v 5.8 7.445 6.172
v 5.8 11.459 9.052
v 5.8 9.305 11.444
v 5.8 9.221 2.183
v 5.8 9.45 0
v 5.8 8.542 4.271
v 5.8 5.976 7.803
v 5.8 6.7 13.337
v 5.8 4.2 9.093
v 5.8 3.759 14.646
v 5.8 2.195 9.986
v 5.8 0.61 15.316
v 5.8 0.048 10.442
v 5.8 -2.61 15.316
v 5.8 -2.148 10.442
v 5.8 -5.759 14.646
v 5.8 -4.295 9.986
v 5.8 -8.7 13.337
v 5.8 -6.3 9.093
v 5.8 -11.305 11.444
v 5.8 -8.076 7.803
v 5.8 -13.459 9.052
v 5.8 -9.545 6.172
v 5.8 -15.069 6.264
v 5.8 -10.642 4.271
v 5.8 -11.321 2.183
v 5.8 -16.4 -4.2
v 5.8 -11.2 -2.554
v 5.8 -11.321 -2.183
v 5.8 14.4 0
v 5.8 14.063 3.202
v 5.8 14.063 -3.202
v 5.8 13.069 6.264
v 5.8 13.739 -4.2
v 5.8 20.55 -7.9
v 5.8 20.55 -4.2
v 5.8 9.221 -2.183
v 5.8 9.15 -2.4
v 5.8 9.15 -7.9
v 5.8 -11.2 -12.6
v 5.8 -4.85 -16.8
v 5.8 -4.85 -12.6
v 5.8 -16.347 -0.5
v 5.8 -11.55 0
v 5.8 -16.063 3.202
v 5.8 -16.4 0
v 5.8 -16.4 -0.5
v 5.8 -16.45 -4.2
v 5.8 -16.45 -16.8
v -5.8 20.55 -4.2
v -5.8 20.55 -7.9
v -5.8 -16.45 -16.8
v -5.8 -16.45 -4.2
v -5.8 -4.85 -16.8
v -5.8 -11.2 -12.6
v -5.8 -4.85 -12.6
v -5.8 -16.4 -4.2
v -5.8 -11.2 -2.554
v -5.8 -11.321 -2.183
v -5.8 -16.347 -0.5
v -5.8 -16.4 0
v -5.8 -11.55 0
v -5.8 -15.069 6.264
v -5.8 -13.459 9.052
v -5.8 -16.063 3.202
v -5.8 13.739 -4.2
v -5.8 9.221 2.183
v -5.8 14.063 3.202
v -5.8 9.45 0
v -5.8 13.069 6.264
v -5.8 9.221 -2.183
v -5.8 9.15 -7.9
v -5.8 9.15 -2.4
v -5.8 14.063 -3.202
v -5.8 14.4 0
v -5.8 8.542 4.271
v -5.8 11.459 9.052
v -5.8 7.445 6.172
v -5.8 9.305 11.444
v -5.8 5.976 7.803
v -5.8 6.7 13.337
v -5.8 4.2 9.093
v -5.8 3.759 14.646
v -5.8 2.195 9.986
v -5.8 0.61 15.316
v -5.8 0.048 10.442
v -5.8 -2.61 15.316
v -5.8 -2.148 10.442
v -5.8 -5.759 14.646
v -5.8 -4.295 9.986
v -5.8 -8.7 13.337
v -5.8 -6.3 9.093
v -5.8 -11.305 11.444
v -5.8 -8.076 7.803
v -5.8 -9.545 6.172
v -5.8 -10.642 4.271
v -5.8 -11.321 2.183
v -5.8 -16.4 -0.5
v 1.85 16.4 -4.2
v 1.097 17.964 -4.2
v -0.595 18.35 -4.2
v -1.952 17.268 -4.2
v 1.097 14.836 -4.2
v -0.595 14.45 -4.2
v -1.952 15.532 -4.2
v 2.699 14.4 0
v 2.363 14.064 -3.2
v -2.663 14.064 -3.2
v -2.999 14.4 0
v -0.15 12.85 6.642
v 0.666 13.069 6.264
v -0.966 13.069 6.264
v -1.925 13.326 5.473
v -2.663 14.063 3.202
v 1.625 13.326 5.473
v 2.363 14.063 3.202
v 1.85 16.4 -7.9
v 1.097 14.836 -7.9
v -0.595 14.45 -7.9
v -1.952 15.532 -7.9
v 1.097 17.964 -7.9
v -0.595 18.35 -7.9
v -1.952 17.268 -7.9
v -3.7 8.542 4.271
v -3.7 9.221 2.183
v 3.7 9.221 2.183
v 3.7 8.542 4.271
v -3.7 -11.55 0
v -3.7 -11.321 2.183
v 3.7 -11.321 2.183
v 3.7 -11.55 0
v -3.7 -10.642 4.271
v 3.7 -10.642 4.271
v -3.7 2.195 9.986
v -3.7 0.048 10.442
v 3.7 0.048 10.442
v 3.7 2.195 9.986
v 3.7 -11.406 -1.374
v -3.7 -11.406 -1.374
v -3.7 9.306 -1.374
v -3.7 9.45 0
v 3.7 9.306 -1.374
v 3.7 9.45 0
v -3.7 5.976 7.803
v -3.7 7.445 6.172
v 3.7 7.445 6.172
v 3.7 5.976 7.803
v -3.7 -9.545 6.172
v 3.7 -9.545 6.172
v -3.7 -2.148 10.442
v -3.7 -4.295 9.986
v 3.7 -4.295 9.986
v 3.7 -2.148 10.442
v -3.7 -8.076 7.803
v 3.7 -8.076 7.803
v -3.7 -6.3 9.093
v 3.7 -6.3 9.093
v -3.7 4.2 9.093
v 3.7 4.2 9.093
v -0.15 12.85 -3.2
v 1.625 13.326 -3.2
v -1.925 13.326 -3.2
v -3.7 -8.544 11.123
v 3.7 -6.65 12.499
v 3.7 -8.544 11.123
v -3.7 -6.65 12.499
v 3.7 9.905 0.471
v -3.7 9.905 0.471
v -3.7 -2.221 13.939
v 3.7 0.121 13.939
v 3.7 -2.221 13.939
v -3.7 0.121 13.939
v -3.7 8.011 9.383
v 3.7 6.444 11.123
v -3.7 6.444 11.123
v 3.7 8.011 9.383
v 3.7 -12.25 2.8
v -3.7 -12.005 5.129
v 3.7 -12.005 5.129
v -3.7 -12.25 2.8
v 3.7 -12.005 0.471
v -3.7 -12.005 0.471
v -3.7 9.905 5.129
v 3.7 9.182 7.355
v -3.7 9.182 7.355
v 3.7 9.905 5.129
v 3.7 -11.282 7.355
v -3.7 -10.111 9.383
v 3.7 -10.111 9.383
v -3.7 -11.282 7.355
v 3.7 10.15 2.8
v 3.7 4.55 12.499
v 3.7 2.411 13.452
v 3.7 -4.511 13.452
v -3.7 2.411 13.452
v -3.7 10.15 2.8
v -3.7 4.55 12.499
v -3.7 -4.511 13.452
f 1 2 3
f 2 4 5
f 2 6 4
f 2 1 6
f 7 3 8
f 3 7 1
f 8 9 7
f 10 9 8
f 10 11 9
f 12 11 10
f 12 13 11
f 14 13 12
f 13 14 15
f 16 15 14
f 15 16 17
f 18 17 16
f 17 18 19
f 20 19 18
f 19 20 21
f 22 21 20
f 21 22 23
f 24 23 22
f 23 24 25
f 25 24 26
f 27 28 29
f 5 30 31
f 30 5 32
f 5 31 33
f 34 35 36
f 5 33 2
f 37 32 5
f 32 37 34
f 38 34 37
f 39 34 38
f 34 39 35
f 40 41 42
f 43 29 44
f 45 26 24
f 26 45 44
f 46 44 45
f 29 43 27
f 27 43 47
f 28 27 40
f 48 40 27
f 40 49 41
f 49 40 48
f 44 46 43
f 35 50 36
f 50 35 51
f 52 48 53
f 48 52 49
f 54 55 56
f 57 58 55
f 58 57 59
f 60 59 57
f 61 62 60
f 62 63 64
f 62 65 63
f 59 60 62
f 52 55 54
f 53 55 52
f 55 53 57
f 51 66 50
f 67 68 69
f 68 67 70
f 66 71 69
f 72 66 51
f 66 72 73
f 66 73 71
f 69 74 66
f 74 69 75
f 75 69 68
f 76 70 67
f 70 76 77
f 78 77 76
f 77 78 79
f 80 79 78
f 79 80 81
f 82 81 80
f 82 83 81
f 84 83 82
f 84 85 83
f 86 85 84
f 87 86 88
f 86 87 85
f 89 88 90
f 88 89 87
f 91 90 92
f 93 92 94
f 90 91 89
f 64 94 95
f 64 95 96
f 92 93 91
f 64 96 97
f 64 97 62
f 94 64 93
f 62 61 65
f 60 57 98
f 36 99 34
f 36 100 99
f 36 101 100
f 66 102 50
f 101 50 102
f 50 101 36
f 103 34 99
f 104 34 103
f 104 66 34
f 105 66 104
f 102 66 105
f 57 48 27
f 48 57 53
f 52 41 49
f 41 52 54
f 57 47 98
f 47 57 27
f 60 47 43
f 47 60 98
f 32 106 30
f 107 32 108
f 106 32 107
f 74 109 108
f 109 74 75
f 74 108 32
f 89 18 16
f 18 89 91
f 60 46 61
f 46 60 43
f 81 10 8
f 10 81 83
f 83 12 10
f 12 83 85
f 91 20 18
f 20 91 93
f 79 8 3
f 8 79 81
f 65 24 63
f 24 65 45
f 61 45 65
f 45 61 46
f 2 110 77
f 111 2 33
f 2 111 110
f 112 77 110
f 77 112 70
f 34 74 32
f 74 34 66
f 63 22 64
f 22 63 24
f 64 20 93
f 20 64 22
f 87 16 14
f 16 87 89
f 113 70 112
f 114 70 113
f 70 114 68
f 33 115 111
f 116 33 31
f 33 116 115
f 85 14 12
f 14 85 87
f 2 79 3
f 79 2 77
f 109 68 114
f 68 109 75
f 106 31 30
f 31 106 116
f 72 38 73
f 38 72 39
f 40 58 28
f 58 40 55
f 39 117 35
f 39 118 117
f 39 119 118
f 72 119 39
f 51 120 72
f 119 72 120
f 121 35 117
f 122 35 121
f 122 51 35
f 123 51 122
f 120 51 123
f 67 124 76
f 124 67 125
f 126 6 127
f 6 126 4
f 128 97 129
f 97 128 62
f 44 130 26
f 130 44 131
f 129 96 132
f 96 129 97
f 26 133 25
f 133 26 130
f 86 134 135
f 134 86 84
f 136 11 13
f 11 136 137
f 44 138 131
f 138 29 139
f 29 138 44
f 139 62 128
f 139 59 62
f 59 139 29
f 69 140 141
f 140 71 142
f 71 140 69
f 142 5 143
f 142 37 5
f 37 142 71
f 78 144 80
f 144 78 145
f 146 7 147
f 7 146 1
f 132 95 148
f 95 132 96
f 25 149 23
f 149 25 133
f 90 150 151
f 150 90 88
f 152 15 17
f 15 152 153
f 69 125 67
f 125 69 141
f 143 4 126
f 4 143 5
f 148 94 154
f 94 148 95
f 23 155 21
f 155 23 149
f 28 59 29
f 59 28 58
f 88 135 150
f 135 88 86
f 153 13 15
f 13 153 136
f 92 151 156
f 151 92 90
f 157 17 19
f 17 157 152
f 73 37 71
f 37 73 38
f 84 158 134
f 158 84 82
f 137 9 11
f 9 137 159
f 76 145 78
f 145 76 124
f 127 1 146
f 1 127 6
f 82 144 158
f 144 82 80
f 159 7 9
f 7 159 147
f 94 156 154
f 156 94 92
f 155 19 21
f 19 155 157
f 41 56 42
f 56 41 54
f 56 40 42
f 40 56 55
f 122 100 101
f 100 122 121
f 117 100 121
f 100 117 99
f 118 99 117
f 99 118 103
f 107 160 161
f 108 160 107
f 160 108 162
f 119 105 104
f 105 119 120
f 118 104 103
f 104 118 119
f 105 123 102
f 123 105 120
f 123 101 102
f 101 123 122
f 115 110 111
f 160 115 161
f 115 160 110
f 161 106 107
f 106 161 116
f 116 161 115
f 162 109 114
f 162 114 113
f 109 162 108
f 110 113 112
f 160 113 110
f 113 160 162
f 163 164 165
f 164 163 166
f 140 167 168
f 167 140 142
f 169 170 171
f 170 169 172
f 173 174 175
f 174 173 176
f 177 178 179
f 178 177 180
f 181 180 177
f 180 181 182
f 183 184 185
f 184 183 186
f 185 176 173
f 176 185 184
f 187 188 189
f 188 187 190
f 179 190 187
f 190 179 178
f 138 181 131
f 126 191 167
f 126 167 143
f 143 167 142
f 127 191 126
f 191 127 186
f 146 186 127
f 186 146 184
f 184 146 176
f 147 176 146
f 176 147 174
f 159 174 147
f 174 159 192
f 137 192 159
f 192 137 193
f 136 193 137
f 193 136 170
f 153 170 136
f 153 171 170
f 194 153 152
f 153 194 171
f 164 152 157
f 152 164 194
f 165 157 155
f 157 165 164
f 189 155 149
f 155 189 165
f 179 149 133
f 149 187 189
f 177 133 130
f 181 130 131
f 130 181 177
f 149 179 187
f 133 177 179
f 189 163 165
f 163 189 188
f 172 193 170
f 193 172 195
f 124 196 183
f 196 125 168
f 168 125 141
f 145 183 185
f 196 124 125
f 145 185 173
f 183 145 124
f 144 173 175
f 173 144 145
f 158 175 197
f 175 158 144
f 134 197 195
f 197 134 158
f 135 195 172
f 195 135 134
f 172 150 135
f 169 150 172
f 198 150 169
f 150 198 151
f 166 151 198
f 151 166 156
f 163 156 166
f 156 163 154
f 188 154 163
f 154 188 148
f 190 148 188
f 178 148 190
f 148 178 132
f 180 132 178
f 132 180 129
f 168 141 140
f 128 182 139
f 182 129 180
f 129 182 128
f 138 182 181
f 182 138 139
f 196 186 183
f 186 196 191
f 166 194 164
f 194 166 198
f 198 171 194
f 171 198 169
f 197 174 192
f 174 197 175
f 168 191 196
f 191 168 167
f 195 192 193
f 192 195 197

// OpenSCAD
// file: ../Tolerance.scad
function LaserCutTolerance() = .02;
function 3dPrinterTolerance() = .4;
// file: ZipTie.scad
function ZipTieWidth()=2.5;
function ZipTieHeight()=1;
function ZipTieLength()=100;

module ZipTie()
{
	cube([ZipTieHeight(),ZipTieLength(), ZipTieWidth()]);
}

ZipTie();
// file: SubtractiveSlidingBearingCap2.scad
use <../Tolerance.scad>
use <../Parameters.scad>
use <../Slider.scad>
use <BallBearing.scad>
use <PlasticScrew.scad>

module BearingCap()
{
translate([-PlasticWidth()/2-BallBearingHeight()/2,-PlasticWidth()/2,-PlasticWidth()*1.25-1.5])
{
	union()
	{
	difference()
	{
		union()
		{
			translate([-3dPrinterTolerance()*2,0,1-3dPrinterTolerance()*2])
			{
				cube([BallBearingHeight()+PlasticWidth()+3dPrinterTolerance()*4, PlasticWidth()+3dPrinterTolerance()*4, SliderHeight()+PlasticWidth()+3dPrinterTolerance()*4]);
			}
			translate([-3dPrinterTolerance()*2,PlasticWidth()+3dPrinterTolerance(),3dPrinterTolerance()])
			{
				cube([BallBearingHeight()+PlasticWidth()+3dPrinterTolerance()*4, PlasticWidth()*2+3dPrinterTolerance(),PlasticWidth()+3dPrinterTolerance()*4+PlasticWidth()]);
			}
			translate([-3dPrinterTolerance()*2,-BallBearingHeight()/2,PlasticWidth()*.25-3dPrinterTolerance()*2])
			{
				cube([BallBearingHeight()+PlasticWidth()+3dPrinterTolerance()*4, BallBearingDiam()/4+PlasticWidth()*2,BallBearingDiam()+PlasticWidth()]);
			}
			translate([-3dPrinterTolerance()*2,-PlasticWidth(),BallBearingDiam()/2+PlasticWidth()*1.25])
			{
				rotate([0,90,0])
				{
					cylinder(BallBearingHeight()+PlasticWidth()+3dPrinterTolerance()*4, BallBearingDiam()/2+PlasticWidth()+3dPrinterTolerance()*2, BallBearingDiam()/2+PlasticWidth()+3dPrinterTolerance()*2);
				}
			}
		}
		translate([-1,-BallBearingHeight()/2,PlasticWidth()*1.25+1+3dPrinterTolerance()])
			{
				cube([BallBearingHeight()+PlasticWidth()+2, BallBearingDiam()/2+PlasticWidth()*2,BallBearingDiam()-PlasticWidth()/4-3dPrinterTolerance()-1]);
			}
	translate([-1,-BallBearingHeight()/2+PlasticWidth()*2-1+3dPrinterTolerance()*3,BallBearingDiam()])
			{
				cube([BallBearingHeight()+PlasticWidth()+2, BallBearingDiam()/2+PlasticWidth(),BallBearingDiam()-PlasticWidth()/4-1]);
			}
		translate([-1,-BallBearingDiam()/2,-PlasticWidth()+3dPrinterTolerance()])
			{
				cube([BallBearingHeight()+PlasticWidth()+2, BallBearingDiam()+PlasticWidth(),PlasticWidth()]);
			}
		translate([-1,-PlasticWidth(),SliderHeight()/2])
		{                                                                                                                                   
			rotate([0,90,0])
			{
				cylinder(BallBearingHeight()+PlasticWidth()+2, BallBearingDiam()/2-PlasticWidth()/6, BallBearingDiam()/2-PlasticWidth()/6);
			}
		}
	}
	translate([-3dPrinterTolerance()*2,PlasticWidth()*2-3dPrinterTolerance()*2,PlasticWidth()-3dPrinterTolerance()])
			{
				cube([BallBearingHeight()+PlasticWidth()+3dPrinterTolerance()*4, PlasticWidth()+3dPrinterTolerance()*4,PlasticWidth()*2+3dPrinterTolerance()*4]);
			}
			translate([PlasticWidth()/2,-BallBearingDiam()/2+PlasticWidth(),SliderHeight()/2])
		{
			rotate([0,90,0])
			{
				BallBearing();
			}
		}
translate([PlasticWidth()/2+ScrewHeadDiameter()/2,-1, SliderHeight()+PlasticWidth()/4])
		{
			rotate([90,0,0])
			{
				union()
				{
					screw();
					cylinder(BallBearingDiam()/2, ScrewHeadDiameter()/2, ScrewHeadDiameter()/2);
				}
			}
		}
}
}
}

//rotate([0,90,0])
//%BallBearing();

//BearingCap();

module SlidingBearingCapSlot()
{
	union()
	{
		BearingCap();
		translate([-BallBearingHeight()/2,-BallBearingDiam()/2+PlasticWidth()/2,0])
			{
				cube([BallBearingHeight(), BallBearingDiam()/2,BallBearingDiam()/2]);
			}
	}
}
		




SlidingBearingCapSlot();
// file: LinearBearing.scad
use <../Tolerance.scad>

function LinearBearingDiam() = 15 + 3dPrinterTolerance();
function LinearBearingInnerDiam() = 8.3 + 3dPrinterTolerance();
function LinearBearingHeight() = 24 + 3dPrinterTolerance();

module LinearBearing()
{
cylinder(LinearBearingHeight(), LinearBearingDiam()/2, LinearBearingDiam()/2, 0);
}


LinearBearing();
// file: Zrod.scad
use <../Tolerance.scad>

function ZrodLength()=1000;
function ZrodDiameter()=8 + 3dPrinterTolerance();  //base case: 8
function ZrodRadius()=ZrodDiameter()/2;

module Zrod()
{
color("Silver")
cylinder(ZrodLength(), ZrodRadius(), ZrodRadius());
}

Zrod();
// file: PlasticScrew.scad
use <../Tolerance.scad>

function ScrewDiameter()= 3.6 + 3dPrinterTolerance();  
function ScrewLength()= 22 + 3dPrinterTolerance();
function ScrewHeadDiameter()= 6.7 + 3dPrinterTolerance();
function ScrewHeadHeight()= 2.5 + 3dPrinterTolerance();

//err on the side of smaller tolerances for screws

module screw()
{
	union()
	{
		translate([0,0,-ScrewLength()])
		{
			cylinder(ScrewLength(), ScrewDiameter()/2,ScrewDiameter()/2);
		}
		cylinder(ScrewHeadHeight(), ScrewHeadDiameter()/2,ScrewHeadDiameter()/2);
	}
}

screw();
// file: BallBearing.scad
use <../Tolerance.scad>

function BallBearingDiam() = 22 + 3dPrinterTolerance(); //USUALLY 22
function BallBearingHeight() = 7 + 3dPrinterTolerance(); //USUALLY 7
function BallBearingInnerDiam()= 7.9 - 3dPrinterTolerance(); //USUALLY 7.9

module BallBearing()
{
cylinder(BallBearingHeight(), BallBearingDiam()/2, BallBearingDiam()/2);
}


BallBearing();
// file: ../Slider.scad
use <Parameters.scad>
use <Vitamins/SubtractiveSlidingBearingCap2.scad>
use <Vitamins/Zrod.scad>
use <Vitamins/LinearBearing.scad>
use <Vitamins/BallBearing.scad>
use <Vitamins/ZipTie.scad>

function BearingGripDiam()= LinearBearingDiam()+PlasticWidth()*2;
function SliderHeight()= LinearBearingHeight()+PlasticWidth()*2;
function GripWidth()= PlasticWidth();
function FlareLength()= (ZBearingSpacing()-ZrodSpacing())/2;
function FlareWidth()= BallBearingDiam()/2-PlasticWidth();

$fn=100;

module LinearBearingGrip()
{
	difference()
	{
		cylinder(SliderHeight(), BearingGripDiam()/2, BearingGripDiam()/2);
		translate([0,0,PlasticWidth()+1])
		{
			LinearBearing();
		}
		translate([0,0,-1])
		{
		cylinder(SliderHeight()+2, LinearBearingDiam()/2.2, LinearBearingDiam()/2.2);
		}
		translate([-BearingGripDiam()/2,LinearBearingDiam()/6,-1])
		{
			cube([SliderHeight()+2, SliderHeight()+2, SliderHeight()+2]);
		}
	}
}

module SliderBase()
{
	union()
	{
		translate([LinearBearingDiam()/2,PlasticWidth()/2-GripWidth(),0])
		{
			cube([ZrodSpacing()-LinearBearingDiam(),GripWidth(),SliderHeight()]);
		}
		translate([0,PlasticWidth()/2,0])
		{
		LinearBearingGrip();				
		}
		translate([ZrodSpacing(),PlasticWidth()/2,0])
		{
		LinearBearingGrip();				
		}
	}
}

module Flare()
{
	translate([-LinearBearingDiam()/2-FlareLength()-PlasticWidth()/2,-GripWidth(),0])
		{
			difference()
			{
				cube([FlareLength(),GripWidth()*2,SliderHeight()]);
					translate([FlareLength()/2-PlasticWidth()/2,0,0])
	{
		//BearingCap();
		SlidingBearingCapSlot();
	}
				}
		}
}

//module BearingCap()
//{
//	translate([-(PlasticWidth()+BallBearingHeight())/2-ZBearingSpacing()/2,-PlasticWidth()*2, -PlasticWidth()])
//	{
//		difference()
//		{
//			union()
//			{
//				cube([BallBearingHeight()+PlasticWidth(), PlasticWidth()*2, SliderHeight()+PlasticWidth()]);
//				translate([0,PlasticWidth()*2,0])
//				{
//					cube([BallBearingHeight()+PlasticWidth(), PlasticWidth()*2,PlasticWidth()]);
//				}
//				translate([0,PlasticWidth()*2,PlasticWidth()])
//				{
//					cube([BallBearingHeight()+PlasticWidth(), PlasticWidth()*2,PlasticWidth()*2]);
//				}
//				translate([0,-BallBearingHeight()/2,PlasticWidth()*.75])
//				{
//					cube([BallBearingHeight()+PlasticWidth(), BallBearingDiam()/4+PlasticWidth()*2,BallBearingDiam()+PlasticWidth()]);
//				}
//				translate([0,-PlasticWidth(),BallBearingDiam()/2+PlasticWidth()*1.25])
//				{
//					rotate([0,90,0])
//					{
//						cylinder(BallBearingHeight()+PlasticWidth(), BallBearingDiam()/2+PlasticWidth()/2, BallBearingDiam()/2+PlasticWidth()/2);
//					}
//				}
//			}
//			translate([-1,-BallBearingHeight()/2,PlasticWidth()*1.25])
//				{
//					cube([BallBearingHeight()+PlasticWidth()+2, BallBearingDiam()/4+PlasticWidth()*2,BallBearingDiam()]);
//				}
//			translate([-1,-PlasticWidth(),SliderHeight()/2])
//			{                                                                                                                                   
//				rotate([0,90,0])
//				{
//					#cylinder(BallBearingHeight()+PlasticWidth()+2, BallBearingDiam()/2-PlasticWidth()/6, BallBearingDiam()/2-PlasticWidth()/6);
//				}
//			}
//		}
//	}
//}

//BearingCap();

module ZipTieHoles()
{
	union()
	{
		translate([LinearBearingDiam()-PlasticWidth()/2,-GripWidth()-1,SliderHeight()/4])
		{
			ZipTie();
		}
		translate([LinearBearingDiam()-PlasticWidth()/2,-GripWidth()-1,SliderHeight()*3/4])
		{
			ZipTie();
		}
		translate([-LinearBearingDiam()+PlasticWidth()/2,-GripWidth()-1,SliderHeight()/4])
		{
			ZipTie();
		}
		translate([-LinearBearingDiam()+PlasticWidth()/2,-GripWidth()-1,SliderHeight()*3/4])
		{
			ZipTie();
		}
	}
}




%cube(size=[ZBearingSpacing(), ZBearingSpacing(), 20,], center=true);


module Slider()
{
	difference()
	{
		union()
		{
			SliderBase();
			ZipTieHoles();			
			Flare();
			mirror([1,0,0])
			{
				translate([-ZrodSpacing(),0,0])
				{
					Flare();
				}
			}
		}
	ZipTieHoles();
	translate([ZrodSpacing()-ZipTieWidth()/2,0,0])
	{
		ZipTieHoles();
	}
	
	

	}
	
}

translate([-ZrodSpacing()/2,0,0])
Slider();
// file: ../Parameters.scad
use<Vitamins/Zrod.scad>
use<Vitamins/LinearBearing.scad>

function mm(i) = i*25.4; 

//Build dimensions (x,y,z)-- x, y and z of printable area, NOT of overall device

//z-rod length, diameter-- dependent on which rods you buy
//(bearing diameter is dependent on rod diameter)


function ZBearingSpacing()= 105;
function ZrodSpacing()=ZBearingSpacing()-LinearBearingDiam()*2-PlasticWidth()*4;
//echo(ZrodSpacing());

//parametric of which hotend is being used (printerbot or bucha nozzle)

//stepper vs servo

//3 parameters (1 for each link) horizontal vs vertical

//paper is a parametric vitamin

//distance between link arms will be calculable based on radius of toolplate




//tolerances
//function LaserCutTolerance() = .02;
//function 3dPrinterTolerance() = .4;



//the equation used for plastic width, it can of course be changed
function PlasticWidth()= (ZrodDiameter()/2);
function SideWidth() = (ZrodDiameter()+PlasticWidth());
// main file
use <../Parameters.scad>
use <../Slider.scad>
use <BallBearing.scad>
use <PlasticScrew.scad>


///this is identical to subtractive sliding bearing cap except that it's centered differently, make this into a boolean at some point

module RawBearingCap()
{
	union()
	{
		difference()
		{
			union()
			{
				translate([0,0,1])
				{
					cube([BallBearingHeight()+PlasticWidth(), PlasticWidth(), SliderHeight()+PlasticWidth()]);
				}
				translate([0,PlasticWidth(),1])
				{
					cube([BallBearingHeight()+PlasticWidth(), PlasticWidth()*2,PlasticWidth()]);
				}
				translate([0,-BallBearingHeight()/2,PlasticWidth()*.25])
				{
					cube([BallBearingHeight()+PlasticWidth(), BallBearingDiam()/4+PlasticWidth()*2,BallBearingDiam()+PlasticWidth()]);
				}
				translate([0,-PlasticWidth(),BallBearingDiam()/2+PlasticWidth()*1.25])
				{
					rotate([0,90,0])
					{
						cylinder(BallBearingHeight()+PlasticWidth(), BallBearingDiam()/2+PlasticWidth(), BallBearingDiam()/2+PlasticWidth());
					}
				}
			}
			translate([-1,-BallBearingHeight()/2,PlasticWidth()*1.25+1])
			{
				cube([BallBearingHeight()+PlasticWidth()+2, BallBearingDiam()/2+PlasticWidth(),BallBearingDiam()-PlasticWidth()/4-1]);
			}
			translate([-1,-BallBearingHeight()/2+PlasticWidth()*2-1,BallBearingDiam()])
			{
				cube([BallBearingHeight()+PlasticWidth()+2, BallBearingDiam()/2+PlasticWidth(),BallBearingDiam()-PlasticWidth()/4-1]);
			}
			translate([-1,-PlasticWidth(),SliderHeight()/2])
			{                                                                                                                                   
				rotate([0,90,0])
				{
					cylinder(BallBearingHeight()+PlasticWidth()+2, BallBearingDiam()/2-PlasticWidth()/6, BallBearingDiam()/2-PlasticWidth()/6);
				}
			}
		}
		translate([0,PlasticWidth()*2,PlasticWidth()])
		{
			cube([BallBearingHeight()+PlasticWidth(), PlasticWidth(),PlasticWidth()*2]);
		}
			
	}
}

module UnPositionedBearingCap()
{
	difference()
	{
		RawBearingCap();
		translate([PlasticWidth()/2,-BallBearingDiam()/2+PlasticWidth(),SliderHeight()/2])
		{
			rotate([0,90,0])
			{
				BallBearing();
			}
		}
		translate([PlasticWidth()/2+ScrewHeadDiameter()/2,-1, SliderHeight()+PlasticWidth()/4])
		{
			rotate([90,0,0])
			{
				union()
				{
					screw();
					cylinder(BallBearingDiam()/2, ScrewHeadDiameter()/2, ScrewHeadDiameter()/2);
				}
			}
		}
	}
}



//rotate([0,90,0])
//%BallBearing();

module BearingCap(Print=true,Foot=true)
{
	if(Print==true)
	{
		translate([-BallBearingDiam()/2-PlasticWidth(),0,BallBearingHeight()+PlasticWidth()])
		{
			rotate([0,90,0])
				{
					UnPositionedBearingCap(true);
				}
		}
	}else{
			if(Foot==true)
			{
				translate([-PlasticWidth()/2-BallBearingHeight()/2,-1-PlasticWidth()*1.25-BallBearingDiam()/2,-PlasticWidth()])
				{
					rotate([-90,0,0])
					{
						UnPositionedBearingCap(false);
					}
				}
			}else{
					translate([-PlasticWidth()/2-BallBearingHeight()/2,-PlasticWidth()/2,-PlasticWidth()*1.25-1.5])
					{
						UnPositionedBearingCap(false);
					}
				}
			}
}

BearingCap(false, true);
